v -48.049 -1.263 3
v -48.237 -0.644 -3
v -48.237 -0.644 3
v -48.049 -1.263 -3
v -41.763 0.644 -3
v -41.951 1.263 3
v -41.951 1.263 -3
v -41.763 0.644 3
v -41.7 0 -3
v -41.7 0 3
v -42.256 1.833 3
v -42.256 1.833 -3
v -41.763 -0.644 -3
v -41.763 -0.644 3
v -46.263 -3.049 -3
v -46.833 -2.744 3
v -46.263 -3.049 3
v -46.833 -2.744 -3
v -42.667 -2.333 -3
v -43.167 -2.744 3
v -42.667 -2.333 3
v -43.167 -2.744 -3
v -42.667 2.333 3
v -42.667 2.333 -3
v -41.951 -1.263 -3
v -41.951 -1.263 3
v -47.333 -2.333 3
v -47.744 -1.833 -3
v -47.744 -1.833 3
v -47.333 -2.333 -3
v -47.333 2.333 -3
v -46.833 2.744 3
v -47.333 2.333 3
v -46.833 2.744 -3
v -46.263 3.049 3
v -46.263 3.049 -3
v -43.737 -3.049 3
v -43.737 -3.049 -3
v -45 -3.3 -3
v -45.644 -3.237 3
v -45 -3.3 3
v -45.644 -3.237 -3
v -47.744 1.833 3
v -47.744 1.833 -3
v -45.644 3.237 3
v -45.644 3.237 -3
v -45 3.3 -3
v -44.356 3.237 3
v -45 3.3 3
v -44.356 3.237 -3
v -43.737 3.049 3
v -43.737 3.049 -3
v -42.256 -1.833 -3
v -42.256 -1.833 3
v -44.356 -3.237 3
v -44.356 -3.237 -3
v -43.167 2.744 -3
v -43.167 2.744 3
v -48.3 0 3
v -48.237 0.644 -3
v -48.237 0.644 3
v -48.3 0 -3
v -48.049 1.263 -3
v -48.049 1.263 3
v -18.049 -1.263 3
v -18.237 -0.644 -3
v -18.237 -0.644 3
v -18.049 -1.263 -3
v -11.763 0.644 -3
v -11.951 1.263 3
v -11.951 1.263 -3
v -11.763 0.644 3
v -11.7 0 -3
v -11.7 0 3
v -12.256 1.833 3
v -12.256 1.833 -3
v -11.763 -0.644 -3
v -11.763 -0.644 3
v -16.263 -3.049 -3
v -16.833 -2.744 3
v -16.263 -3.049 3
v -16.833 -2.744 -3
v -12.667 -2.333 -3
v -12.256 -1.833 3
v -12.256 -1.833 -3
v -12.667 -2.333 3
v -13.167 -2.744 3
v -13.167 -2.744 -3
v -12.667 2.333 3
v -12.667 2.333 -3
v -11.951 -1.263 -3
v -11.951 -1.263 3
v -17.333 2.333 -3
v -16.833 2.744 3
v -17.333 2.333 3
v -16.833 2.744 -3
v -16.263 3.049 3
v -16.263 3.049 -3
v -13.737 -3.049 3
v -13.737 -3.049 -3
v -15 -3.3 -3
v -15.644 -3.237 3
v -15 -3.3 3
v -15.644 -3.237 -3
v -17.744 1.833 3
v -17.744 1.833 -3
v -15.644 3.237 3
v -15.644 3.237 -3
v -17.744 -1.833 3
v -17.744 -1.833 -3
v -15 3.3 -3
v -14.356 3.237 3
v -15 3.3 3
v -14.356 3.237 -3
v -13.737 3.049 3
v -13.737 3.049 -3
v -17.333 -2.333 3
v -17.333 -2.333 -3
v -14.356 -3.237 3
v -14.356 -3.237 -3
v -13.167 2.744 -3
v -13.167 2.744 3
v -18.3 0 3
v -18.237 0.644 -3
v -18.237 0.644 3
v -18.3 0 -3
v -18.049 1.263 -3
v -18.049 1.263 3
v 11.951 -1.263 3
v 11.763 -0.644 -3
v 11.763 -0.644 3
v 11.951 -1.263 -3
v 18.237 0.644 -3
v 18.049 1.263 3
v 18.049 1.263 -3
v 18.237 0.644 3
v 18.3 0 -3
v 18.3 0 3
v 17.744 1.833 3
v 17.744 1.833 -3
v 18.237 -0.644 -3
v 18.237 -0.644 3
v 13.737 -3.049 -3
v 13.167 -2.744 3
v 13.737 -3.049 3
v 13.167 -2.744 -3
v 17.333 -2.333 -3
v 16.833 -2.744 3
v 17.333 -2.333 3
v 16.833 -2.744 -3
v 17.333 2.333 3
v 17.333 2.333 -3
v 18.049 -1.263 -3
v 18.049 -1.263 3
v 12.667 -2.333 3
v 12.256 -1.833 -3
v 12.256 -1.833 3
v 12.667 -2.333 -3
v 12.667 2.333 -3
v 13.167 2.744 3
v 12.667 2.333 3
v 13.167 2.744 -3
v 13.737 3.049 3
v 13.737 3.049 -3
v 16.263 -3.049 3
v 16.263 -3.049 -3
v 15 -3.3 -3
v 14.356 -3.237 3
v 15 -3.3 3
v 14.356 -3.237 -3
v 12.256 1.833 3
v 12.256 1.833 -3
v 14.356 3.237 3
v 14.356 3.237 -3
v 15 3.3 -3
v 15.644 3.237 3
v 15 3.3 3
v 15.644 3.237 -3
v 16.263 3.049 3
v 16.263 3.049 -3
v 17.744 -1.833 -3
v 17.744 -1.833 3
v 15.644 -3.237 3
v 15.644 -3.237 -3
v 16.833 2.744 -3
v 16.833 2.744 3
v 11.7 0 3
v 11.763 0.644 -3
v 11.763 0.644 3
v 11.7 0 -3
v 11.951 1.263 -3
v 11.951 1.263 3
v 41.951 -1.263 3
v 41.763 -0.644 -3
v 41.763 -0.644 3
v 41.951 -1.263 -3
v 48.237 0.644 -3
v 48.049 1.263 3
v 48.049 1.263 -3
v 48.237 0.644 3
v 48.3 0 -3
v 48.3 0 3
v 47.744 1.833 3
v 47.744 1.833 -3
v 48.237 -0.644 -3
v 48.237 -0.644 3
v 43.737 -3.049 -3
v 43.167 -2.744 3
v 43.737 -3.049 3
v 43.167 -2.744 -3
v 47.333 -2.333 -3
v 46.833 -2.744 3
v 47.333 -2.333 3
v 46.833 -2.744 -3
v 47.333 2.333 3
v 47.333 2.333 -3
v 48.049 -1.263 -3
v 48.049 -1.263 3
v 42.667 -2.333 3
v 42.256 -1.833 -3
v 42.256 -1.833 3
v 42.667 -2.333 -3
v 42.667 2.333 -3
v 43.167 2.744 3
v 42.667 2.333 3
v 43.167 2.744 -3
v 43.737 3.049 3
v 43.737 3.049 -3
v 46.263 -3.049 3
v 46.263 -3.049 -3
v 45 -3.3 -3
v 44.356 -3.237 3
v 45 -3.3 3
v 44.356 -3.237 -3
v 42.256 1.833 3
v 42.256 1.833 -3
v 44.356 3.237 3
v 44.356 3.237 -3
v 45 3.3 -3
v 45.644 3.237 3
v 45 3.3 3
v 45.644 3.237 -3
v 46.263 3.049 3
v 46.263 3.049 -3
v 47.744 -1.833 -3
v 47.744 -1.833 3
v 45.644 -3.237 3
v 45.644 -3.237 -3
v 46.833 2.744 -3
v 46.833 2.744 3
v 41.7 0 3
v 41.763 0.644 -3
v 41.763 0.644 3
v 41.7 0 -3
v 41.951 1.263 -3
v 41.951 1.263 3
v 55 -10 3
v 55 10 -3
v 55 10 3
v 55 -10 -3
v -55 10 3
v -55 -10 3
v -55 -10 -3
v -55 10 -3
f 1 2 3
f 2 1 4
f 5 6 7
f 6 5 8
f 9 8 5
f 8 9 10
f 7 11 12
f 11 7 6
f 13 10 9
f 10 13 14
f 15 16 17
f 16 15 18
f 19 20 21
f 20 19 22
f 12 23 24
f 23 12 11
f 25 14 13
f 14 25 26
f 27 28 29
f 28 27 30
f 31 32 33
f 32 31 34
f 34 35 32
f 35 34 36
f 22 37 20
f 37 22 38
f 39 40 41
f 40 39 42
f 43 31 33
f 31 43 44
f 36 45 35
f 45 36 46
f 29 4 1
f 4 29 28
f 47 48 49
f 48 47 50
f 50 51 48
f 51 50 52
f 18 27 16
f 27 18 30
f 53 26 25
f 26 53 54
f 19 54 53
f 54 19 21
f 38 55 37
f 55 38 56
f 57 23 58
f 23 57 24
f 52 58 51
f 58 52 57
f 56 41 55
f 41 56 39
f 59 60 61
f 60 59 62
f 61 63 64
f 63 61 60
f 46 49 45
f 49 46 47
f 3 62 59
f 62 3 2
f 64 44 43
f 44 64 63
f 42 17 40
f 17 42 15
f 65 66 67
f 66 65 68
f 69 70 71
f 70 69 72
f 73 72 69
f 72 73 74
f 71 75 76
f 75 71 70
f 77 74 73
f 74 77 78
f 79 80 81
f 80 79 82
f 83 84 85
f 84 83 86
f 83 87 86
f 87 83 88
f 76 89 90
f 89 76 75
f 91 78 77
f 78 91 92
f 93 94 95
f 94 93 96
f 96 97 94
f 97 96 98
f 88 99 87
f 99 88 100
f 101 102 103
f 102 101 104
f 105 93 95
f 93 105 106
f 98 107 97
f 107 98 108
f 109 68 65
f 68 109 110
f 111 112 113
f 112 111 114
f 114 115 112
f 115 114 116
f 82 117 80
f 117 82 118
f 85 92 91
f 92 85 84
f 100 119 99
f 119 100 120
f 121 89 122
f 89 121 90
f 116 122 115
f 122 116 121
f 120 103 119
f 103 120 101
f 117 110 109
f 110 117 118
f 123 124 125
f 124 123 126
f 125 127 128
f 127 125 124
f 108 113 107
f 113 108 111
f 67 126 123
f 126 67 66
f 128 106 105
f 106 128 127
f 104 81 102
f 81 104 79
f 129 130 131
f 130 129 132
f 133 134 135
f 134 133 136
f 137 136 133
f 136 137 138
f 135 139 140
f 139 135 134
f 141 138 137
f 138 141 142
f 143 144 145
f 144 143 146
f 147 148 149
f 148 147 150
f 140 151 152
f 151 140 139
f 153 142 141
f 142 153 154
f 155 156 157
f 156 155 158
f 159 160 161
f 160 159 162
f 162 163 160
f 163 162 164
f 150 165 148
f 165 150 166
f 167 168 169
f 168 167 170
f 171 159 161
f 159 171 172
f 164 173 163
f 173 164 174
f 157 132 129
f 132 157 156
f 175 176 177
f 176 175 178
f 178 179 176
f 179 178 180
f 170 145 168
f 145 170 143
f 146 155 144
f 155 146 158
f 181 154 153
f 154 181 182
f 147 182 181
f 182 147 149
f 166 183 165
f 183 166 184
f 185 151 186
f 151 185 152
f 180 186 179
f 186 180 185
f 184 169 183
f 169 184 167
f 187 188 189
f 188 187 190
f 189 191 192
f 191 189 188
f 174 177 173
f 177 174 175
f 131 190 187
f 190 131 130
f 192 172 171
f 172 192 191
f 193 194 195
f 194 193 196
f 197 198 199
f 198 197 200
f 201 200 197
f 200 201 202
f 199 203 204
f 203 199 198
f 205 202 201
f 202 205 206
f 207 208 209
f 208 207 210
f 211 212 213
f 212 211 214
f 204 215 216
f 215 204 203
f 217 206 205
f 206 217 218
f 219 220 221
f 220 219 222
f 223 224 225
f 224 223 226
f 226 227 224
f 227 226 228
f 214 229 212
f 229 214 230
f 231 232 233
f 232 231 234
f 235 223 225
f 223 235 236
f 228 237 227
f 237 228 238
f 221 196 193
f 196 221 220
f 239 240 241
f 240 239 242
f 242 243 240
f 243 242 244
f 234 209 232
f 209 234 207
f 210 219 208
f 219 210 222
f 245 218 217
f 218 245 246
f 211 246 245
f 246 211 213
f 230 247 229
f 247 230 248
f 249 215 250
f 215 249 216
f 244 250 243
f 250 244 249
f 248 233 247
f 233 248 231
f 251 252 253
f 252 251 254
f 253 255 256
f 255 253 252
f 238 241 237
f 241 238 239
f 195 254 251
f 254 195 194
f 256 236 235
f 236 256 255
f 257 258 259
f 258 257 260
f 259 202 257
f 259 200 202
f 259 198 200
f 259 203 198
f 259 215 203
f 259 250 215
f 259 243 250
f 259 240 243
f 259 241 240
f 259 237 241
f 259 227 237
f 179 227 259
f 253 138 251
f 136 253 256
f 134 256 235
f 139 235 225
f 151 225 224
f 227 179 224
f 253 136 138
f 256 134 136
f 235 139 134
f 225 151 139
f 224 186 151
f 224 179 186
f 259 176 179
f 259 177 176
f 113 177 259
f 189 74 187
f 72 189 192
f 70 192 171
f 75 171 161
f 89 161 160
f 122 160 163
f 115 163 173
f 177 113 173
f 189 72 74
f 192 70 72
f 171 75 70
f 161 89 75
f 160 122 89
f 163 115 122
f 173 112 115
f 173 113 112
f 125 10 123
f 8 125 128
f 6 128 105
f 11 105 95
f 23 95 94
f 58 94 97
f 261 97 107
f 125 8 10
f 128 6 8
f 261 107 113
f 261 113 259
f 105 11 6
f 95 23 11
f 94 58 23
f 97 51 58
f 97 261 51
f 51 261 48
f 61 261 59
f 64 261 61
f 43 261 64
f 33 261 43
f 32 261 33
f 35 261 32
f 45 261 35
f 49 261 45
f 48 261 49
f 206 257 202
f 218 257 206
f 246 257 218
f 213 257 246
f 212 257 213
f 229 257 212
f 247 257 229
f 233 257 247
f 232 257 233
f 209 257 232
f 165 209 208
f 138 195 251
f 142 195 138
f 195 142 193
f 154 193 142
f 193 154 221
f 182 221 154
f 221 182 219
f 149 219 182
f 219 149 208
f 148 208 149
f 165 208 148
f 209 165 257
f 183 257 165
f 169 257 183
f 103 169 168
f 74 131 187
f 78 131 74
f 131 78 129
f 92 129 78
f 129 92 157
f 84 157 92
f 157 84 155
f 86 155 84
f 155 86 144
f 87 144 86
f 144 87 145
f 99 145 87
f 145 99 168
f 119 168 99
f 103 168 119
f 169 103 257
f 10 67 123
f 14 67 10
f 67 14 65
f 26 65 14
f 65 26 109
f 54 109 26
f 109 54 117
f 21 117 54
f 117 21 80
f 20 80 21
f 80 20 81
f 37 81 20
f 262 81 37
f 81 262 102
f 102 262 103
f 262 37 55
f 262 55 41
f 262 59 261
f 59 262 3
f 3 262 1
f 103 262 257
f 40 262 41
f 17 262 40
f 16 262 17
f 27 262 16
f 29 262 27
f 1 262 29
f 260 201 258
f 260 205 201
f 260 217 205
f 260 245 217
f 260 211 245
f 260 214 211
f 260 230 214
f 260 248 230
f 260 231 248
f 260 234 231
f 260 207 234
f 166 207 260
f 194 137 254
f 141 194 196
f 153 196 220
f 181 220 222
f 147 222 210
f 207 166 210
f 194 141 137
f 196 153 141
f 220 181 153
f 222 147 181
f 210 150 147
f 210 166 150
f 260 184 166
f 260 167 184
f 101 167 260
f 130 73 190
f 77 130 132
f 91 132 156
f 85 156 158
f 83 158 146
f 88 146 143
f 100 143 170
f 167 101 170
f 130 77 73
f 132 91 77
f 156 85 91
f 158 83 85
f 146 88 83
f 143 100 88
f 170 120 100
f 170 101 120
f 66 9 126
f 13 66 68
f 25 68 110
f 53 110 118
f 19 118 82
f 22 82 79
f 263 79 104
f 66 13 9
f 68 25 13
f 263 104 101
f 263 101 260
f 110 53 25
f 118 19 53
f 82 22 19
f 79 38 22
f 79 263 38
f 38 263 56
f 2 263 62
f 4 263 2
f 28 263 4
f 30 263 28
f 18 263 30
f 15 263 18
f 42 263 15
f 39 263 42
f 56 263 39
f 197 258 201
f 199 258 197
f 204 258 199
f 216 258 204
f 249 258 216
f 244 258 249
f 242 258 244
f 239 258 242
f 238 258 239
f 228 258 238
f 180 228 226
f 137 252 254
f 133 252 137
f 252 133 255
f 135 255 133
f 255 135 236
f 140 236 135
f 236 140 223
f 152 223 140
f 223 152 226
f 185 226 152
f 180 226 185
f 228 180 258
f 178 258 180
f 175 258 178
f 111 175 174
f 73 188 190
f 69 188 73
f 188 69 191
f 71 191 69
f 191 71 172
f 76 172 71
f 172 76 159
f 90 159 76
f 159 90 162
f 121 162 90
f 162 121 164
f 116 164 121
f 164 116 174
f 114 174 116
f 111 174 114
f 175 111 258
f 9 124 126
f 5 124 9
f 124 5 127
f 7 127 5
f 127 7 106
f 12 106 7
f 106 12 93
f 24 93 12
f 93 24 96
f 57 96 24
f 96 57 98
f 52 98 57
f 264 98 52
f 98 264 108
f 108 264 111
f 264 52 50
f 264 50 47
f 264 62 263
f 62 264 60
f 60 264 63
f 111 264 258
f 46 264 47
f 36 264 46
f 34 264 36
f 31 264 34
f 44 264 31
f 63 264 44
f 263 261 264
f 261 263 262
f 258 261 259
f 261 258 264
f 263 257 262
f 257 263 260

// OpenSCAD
$fn = 32;

// ----------------------------------------------------------------------
// Hole bar, 4 x Ø6.6
// row layout, 10 mm edge offset
// ----------------------------------------------------------------------

// --- parameters (mm) ---
bar_w = 20;    // bar width (Y)
bar_t = 6;     // bar thickness (Z)
holes = 4;     // holes per row
hole_d = 6.6;  // hole diameter
edge = 10;     // offset from the bar end to the first hole
pitch = 30;    // pitch between neighbouring holes

// --- derived feature positions (mm) ---
span = (holes - 1) * pitch;   // = 90   distance between the end holes
bar_l = span + 2 * edge;      // = 110   overall bar length
start_x = -bar_l / 2 + edge;  // = -45   X of the first hole
feature_centers = [
  [start_x + 0 * pitch, 0],
  [start_x + 1 * pitch, 0],
  [start_x + 2 * pitch, 0],
  [start_x + 3 * pitch, 0]
];   // hole centres of the first row

// bar with one row of holes, drilled from feature_centers
difference() {
  translate([-bar_l / 2, -bar_w / 2, -bar_t / 2]) cube([bar_l, bar_w, bar_t]);
  for (centre = feature_centers)
    translate([centre[0], centre[1], 0])
      cylinder(d = hole_d, h = bar_t + 2, center = true);
}
